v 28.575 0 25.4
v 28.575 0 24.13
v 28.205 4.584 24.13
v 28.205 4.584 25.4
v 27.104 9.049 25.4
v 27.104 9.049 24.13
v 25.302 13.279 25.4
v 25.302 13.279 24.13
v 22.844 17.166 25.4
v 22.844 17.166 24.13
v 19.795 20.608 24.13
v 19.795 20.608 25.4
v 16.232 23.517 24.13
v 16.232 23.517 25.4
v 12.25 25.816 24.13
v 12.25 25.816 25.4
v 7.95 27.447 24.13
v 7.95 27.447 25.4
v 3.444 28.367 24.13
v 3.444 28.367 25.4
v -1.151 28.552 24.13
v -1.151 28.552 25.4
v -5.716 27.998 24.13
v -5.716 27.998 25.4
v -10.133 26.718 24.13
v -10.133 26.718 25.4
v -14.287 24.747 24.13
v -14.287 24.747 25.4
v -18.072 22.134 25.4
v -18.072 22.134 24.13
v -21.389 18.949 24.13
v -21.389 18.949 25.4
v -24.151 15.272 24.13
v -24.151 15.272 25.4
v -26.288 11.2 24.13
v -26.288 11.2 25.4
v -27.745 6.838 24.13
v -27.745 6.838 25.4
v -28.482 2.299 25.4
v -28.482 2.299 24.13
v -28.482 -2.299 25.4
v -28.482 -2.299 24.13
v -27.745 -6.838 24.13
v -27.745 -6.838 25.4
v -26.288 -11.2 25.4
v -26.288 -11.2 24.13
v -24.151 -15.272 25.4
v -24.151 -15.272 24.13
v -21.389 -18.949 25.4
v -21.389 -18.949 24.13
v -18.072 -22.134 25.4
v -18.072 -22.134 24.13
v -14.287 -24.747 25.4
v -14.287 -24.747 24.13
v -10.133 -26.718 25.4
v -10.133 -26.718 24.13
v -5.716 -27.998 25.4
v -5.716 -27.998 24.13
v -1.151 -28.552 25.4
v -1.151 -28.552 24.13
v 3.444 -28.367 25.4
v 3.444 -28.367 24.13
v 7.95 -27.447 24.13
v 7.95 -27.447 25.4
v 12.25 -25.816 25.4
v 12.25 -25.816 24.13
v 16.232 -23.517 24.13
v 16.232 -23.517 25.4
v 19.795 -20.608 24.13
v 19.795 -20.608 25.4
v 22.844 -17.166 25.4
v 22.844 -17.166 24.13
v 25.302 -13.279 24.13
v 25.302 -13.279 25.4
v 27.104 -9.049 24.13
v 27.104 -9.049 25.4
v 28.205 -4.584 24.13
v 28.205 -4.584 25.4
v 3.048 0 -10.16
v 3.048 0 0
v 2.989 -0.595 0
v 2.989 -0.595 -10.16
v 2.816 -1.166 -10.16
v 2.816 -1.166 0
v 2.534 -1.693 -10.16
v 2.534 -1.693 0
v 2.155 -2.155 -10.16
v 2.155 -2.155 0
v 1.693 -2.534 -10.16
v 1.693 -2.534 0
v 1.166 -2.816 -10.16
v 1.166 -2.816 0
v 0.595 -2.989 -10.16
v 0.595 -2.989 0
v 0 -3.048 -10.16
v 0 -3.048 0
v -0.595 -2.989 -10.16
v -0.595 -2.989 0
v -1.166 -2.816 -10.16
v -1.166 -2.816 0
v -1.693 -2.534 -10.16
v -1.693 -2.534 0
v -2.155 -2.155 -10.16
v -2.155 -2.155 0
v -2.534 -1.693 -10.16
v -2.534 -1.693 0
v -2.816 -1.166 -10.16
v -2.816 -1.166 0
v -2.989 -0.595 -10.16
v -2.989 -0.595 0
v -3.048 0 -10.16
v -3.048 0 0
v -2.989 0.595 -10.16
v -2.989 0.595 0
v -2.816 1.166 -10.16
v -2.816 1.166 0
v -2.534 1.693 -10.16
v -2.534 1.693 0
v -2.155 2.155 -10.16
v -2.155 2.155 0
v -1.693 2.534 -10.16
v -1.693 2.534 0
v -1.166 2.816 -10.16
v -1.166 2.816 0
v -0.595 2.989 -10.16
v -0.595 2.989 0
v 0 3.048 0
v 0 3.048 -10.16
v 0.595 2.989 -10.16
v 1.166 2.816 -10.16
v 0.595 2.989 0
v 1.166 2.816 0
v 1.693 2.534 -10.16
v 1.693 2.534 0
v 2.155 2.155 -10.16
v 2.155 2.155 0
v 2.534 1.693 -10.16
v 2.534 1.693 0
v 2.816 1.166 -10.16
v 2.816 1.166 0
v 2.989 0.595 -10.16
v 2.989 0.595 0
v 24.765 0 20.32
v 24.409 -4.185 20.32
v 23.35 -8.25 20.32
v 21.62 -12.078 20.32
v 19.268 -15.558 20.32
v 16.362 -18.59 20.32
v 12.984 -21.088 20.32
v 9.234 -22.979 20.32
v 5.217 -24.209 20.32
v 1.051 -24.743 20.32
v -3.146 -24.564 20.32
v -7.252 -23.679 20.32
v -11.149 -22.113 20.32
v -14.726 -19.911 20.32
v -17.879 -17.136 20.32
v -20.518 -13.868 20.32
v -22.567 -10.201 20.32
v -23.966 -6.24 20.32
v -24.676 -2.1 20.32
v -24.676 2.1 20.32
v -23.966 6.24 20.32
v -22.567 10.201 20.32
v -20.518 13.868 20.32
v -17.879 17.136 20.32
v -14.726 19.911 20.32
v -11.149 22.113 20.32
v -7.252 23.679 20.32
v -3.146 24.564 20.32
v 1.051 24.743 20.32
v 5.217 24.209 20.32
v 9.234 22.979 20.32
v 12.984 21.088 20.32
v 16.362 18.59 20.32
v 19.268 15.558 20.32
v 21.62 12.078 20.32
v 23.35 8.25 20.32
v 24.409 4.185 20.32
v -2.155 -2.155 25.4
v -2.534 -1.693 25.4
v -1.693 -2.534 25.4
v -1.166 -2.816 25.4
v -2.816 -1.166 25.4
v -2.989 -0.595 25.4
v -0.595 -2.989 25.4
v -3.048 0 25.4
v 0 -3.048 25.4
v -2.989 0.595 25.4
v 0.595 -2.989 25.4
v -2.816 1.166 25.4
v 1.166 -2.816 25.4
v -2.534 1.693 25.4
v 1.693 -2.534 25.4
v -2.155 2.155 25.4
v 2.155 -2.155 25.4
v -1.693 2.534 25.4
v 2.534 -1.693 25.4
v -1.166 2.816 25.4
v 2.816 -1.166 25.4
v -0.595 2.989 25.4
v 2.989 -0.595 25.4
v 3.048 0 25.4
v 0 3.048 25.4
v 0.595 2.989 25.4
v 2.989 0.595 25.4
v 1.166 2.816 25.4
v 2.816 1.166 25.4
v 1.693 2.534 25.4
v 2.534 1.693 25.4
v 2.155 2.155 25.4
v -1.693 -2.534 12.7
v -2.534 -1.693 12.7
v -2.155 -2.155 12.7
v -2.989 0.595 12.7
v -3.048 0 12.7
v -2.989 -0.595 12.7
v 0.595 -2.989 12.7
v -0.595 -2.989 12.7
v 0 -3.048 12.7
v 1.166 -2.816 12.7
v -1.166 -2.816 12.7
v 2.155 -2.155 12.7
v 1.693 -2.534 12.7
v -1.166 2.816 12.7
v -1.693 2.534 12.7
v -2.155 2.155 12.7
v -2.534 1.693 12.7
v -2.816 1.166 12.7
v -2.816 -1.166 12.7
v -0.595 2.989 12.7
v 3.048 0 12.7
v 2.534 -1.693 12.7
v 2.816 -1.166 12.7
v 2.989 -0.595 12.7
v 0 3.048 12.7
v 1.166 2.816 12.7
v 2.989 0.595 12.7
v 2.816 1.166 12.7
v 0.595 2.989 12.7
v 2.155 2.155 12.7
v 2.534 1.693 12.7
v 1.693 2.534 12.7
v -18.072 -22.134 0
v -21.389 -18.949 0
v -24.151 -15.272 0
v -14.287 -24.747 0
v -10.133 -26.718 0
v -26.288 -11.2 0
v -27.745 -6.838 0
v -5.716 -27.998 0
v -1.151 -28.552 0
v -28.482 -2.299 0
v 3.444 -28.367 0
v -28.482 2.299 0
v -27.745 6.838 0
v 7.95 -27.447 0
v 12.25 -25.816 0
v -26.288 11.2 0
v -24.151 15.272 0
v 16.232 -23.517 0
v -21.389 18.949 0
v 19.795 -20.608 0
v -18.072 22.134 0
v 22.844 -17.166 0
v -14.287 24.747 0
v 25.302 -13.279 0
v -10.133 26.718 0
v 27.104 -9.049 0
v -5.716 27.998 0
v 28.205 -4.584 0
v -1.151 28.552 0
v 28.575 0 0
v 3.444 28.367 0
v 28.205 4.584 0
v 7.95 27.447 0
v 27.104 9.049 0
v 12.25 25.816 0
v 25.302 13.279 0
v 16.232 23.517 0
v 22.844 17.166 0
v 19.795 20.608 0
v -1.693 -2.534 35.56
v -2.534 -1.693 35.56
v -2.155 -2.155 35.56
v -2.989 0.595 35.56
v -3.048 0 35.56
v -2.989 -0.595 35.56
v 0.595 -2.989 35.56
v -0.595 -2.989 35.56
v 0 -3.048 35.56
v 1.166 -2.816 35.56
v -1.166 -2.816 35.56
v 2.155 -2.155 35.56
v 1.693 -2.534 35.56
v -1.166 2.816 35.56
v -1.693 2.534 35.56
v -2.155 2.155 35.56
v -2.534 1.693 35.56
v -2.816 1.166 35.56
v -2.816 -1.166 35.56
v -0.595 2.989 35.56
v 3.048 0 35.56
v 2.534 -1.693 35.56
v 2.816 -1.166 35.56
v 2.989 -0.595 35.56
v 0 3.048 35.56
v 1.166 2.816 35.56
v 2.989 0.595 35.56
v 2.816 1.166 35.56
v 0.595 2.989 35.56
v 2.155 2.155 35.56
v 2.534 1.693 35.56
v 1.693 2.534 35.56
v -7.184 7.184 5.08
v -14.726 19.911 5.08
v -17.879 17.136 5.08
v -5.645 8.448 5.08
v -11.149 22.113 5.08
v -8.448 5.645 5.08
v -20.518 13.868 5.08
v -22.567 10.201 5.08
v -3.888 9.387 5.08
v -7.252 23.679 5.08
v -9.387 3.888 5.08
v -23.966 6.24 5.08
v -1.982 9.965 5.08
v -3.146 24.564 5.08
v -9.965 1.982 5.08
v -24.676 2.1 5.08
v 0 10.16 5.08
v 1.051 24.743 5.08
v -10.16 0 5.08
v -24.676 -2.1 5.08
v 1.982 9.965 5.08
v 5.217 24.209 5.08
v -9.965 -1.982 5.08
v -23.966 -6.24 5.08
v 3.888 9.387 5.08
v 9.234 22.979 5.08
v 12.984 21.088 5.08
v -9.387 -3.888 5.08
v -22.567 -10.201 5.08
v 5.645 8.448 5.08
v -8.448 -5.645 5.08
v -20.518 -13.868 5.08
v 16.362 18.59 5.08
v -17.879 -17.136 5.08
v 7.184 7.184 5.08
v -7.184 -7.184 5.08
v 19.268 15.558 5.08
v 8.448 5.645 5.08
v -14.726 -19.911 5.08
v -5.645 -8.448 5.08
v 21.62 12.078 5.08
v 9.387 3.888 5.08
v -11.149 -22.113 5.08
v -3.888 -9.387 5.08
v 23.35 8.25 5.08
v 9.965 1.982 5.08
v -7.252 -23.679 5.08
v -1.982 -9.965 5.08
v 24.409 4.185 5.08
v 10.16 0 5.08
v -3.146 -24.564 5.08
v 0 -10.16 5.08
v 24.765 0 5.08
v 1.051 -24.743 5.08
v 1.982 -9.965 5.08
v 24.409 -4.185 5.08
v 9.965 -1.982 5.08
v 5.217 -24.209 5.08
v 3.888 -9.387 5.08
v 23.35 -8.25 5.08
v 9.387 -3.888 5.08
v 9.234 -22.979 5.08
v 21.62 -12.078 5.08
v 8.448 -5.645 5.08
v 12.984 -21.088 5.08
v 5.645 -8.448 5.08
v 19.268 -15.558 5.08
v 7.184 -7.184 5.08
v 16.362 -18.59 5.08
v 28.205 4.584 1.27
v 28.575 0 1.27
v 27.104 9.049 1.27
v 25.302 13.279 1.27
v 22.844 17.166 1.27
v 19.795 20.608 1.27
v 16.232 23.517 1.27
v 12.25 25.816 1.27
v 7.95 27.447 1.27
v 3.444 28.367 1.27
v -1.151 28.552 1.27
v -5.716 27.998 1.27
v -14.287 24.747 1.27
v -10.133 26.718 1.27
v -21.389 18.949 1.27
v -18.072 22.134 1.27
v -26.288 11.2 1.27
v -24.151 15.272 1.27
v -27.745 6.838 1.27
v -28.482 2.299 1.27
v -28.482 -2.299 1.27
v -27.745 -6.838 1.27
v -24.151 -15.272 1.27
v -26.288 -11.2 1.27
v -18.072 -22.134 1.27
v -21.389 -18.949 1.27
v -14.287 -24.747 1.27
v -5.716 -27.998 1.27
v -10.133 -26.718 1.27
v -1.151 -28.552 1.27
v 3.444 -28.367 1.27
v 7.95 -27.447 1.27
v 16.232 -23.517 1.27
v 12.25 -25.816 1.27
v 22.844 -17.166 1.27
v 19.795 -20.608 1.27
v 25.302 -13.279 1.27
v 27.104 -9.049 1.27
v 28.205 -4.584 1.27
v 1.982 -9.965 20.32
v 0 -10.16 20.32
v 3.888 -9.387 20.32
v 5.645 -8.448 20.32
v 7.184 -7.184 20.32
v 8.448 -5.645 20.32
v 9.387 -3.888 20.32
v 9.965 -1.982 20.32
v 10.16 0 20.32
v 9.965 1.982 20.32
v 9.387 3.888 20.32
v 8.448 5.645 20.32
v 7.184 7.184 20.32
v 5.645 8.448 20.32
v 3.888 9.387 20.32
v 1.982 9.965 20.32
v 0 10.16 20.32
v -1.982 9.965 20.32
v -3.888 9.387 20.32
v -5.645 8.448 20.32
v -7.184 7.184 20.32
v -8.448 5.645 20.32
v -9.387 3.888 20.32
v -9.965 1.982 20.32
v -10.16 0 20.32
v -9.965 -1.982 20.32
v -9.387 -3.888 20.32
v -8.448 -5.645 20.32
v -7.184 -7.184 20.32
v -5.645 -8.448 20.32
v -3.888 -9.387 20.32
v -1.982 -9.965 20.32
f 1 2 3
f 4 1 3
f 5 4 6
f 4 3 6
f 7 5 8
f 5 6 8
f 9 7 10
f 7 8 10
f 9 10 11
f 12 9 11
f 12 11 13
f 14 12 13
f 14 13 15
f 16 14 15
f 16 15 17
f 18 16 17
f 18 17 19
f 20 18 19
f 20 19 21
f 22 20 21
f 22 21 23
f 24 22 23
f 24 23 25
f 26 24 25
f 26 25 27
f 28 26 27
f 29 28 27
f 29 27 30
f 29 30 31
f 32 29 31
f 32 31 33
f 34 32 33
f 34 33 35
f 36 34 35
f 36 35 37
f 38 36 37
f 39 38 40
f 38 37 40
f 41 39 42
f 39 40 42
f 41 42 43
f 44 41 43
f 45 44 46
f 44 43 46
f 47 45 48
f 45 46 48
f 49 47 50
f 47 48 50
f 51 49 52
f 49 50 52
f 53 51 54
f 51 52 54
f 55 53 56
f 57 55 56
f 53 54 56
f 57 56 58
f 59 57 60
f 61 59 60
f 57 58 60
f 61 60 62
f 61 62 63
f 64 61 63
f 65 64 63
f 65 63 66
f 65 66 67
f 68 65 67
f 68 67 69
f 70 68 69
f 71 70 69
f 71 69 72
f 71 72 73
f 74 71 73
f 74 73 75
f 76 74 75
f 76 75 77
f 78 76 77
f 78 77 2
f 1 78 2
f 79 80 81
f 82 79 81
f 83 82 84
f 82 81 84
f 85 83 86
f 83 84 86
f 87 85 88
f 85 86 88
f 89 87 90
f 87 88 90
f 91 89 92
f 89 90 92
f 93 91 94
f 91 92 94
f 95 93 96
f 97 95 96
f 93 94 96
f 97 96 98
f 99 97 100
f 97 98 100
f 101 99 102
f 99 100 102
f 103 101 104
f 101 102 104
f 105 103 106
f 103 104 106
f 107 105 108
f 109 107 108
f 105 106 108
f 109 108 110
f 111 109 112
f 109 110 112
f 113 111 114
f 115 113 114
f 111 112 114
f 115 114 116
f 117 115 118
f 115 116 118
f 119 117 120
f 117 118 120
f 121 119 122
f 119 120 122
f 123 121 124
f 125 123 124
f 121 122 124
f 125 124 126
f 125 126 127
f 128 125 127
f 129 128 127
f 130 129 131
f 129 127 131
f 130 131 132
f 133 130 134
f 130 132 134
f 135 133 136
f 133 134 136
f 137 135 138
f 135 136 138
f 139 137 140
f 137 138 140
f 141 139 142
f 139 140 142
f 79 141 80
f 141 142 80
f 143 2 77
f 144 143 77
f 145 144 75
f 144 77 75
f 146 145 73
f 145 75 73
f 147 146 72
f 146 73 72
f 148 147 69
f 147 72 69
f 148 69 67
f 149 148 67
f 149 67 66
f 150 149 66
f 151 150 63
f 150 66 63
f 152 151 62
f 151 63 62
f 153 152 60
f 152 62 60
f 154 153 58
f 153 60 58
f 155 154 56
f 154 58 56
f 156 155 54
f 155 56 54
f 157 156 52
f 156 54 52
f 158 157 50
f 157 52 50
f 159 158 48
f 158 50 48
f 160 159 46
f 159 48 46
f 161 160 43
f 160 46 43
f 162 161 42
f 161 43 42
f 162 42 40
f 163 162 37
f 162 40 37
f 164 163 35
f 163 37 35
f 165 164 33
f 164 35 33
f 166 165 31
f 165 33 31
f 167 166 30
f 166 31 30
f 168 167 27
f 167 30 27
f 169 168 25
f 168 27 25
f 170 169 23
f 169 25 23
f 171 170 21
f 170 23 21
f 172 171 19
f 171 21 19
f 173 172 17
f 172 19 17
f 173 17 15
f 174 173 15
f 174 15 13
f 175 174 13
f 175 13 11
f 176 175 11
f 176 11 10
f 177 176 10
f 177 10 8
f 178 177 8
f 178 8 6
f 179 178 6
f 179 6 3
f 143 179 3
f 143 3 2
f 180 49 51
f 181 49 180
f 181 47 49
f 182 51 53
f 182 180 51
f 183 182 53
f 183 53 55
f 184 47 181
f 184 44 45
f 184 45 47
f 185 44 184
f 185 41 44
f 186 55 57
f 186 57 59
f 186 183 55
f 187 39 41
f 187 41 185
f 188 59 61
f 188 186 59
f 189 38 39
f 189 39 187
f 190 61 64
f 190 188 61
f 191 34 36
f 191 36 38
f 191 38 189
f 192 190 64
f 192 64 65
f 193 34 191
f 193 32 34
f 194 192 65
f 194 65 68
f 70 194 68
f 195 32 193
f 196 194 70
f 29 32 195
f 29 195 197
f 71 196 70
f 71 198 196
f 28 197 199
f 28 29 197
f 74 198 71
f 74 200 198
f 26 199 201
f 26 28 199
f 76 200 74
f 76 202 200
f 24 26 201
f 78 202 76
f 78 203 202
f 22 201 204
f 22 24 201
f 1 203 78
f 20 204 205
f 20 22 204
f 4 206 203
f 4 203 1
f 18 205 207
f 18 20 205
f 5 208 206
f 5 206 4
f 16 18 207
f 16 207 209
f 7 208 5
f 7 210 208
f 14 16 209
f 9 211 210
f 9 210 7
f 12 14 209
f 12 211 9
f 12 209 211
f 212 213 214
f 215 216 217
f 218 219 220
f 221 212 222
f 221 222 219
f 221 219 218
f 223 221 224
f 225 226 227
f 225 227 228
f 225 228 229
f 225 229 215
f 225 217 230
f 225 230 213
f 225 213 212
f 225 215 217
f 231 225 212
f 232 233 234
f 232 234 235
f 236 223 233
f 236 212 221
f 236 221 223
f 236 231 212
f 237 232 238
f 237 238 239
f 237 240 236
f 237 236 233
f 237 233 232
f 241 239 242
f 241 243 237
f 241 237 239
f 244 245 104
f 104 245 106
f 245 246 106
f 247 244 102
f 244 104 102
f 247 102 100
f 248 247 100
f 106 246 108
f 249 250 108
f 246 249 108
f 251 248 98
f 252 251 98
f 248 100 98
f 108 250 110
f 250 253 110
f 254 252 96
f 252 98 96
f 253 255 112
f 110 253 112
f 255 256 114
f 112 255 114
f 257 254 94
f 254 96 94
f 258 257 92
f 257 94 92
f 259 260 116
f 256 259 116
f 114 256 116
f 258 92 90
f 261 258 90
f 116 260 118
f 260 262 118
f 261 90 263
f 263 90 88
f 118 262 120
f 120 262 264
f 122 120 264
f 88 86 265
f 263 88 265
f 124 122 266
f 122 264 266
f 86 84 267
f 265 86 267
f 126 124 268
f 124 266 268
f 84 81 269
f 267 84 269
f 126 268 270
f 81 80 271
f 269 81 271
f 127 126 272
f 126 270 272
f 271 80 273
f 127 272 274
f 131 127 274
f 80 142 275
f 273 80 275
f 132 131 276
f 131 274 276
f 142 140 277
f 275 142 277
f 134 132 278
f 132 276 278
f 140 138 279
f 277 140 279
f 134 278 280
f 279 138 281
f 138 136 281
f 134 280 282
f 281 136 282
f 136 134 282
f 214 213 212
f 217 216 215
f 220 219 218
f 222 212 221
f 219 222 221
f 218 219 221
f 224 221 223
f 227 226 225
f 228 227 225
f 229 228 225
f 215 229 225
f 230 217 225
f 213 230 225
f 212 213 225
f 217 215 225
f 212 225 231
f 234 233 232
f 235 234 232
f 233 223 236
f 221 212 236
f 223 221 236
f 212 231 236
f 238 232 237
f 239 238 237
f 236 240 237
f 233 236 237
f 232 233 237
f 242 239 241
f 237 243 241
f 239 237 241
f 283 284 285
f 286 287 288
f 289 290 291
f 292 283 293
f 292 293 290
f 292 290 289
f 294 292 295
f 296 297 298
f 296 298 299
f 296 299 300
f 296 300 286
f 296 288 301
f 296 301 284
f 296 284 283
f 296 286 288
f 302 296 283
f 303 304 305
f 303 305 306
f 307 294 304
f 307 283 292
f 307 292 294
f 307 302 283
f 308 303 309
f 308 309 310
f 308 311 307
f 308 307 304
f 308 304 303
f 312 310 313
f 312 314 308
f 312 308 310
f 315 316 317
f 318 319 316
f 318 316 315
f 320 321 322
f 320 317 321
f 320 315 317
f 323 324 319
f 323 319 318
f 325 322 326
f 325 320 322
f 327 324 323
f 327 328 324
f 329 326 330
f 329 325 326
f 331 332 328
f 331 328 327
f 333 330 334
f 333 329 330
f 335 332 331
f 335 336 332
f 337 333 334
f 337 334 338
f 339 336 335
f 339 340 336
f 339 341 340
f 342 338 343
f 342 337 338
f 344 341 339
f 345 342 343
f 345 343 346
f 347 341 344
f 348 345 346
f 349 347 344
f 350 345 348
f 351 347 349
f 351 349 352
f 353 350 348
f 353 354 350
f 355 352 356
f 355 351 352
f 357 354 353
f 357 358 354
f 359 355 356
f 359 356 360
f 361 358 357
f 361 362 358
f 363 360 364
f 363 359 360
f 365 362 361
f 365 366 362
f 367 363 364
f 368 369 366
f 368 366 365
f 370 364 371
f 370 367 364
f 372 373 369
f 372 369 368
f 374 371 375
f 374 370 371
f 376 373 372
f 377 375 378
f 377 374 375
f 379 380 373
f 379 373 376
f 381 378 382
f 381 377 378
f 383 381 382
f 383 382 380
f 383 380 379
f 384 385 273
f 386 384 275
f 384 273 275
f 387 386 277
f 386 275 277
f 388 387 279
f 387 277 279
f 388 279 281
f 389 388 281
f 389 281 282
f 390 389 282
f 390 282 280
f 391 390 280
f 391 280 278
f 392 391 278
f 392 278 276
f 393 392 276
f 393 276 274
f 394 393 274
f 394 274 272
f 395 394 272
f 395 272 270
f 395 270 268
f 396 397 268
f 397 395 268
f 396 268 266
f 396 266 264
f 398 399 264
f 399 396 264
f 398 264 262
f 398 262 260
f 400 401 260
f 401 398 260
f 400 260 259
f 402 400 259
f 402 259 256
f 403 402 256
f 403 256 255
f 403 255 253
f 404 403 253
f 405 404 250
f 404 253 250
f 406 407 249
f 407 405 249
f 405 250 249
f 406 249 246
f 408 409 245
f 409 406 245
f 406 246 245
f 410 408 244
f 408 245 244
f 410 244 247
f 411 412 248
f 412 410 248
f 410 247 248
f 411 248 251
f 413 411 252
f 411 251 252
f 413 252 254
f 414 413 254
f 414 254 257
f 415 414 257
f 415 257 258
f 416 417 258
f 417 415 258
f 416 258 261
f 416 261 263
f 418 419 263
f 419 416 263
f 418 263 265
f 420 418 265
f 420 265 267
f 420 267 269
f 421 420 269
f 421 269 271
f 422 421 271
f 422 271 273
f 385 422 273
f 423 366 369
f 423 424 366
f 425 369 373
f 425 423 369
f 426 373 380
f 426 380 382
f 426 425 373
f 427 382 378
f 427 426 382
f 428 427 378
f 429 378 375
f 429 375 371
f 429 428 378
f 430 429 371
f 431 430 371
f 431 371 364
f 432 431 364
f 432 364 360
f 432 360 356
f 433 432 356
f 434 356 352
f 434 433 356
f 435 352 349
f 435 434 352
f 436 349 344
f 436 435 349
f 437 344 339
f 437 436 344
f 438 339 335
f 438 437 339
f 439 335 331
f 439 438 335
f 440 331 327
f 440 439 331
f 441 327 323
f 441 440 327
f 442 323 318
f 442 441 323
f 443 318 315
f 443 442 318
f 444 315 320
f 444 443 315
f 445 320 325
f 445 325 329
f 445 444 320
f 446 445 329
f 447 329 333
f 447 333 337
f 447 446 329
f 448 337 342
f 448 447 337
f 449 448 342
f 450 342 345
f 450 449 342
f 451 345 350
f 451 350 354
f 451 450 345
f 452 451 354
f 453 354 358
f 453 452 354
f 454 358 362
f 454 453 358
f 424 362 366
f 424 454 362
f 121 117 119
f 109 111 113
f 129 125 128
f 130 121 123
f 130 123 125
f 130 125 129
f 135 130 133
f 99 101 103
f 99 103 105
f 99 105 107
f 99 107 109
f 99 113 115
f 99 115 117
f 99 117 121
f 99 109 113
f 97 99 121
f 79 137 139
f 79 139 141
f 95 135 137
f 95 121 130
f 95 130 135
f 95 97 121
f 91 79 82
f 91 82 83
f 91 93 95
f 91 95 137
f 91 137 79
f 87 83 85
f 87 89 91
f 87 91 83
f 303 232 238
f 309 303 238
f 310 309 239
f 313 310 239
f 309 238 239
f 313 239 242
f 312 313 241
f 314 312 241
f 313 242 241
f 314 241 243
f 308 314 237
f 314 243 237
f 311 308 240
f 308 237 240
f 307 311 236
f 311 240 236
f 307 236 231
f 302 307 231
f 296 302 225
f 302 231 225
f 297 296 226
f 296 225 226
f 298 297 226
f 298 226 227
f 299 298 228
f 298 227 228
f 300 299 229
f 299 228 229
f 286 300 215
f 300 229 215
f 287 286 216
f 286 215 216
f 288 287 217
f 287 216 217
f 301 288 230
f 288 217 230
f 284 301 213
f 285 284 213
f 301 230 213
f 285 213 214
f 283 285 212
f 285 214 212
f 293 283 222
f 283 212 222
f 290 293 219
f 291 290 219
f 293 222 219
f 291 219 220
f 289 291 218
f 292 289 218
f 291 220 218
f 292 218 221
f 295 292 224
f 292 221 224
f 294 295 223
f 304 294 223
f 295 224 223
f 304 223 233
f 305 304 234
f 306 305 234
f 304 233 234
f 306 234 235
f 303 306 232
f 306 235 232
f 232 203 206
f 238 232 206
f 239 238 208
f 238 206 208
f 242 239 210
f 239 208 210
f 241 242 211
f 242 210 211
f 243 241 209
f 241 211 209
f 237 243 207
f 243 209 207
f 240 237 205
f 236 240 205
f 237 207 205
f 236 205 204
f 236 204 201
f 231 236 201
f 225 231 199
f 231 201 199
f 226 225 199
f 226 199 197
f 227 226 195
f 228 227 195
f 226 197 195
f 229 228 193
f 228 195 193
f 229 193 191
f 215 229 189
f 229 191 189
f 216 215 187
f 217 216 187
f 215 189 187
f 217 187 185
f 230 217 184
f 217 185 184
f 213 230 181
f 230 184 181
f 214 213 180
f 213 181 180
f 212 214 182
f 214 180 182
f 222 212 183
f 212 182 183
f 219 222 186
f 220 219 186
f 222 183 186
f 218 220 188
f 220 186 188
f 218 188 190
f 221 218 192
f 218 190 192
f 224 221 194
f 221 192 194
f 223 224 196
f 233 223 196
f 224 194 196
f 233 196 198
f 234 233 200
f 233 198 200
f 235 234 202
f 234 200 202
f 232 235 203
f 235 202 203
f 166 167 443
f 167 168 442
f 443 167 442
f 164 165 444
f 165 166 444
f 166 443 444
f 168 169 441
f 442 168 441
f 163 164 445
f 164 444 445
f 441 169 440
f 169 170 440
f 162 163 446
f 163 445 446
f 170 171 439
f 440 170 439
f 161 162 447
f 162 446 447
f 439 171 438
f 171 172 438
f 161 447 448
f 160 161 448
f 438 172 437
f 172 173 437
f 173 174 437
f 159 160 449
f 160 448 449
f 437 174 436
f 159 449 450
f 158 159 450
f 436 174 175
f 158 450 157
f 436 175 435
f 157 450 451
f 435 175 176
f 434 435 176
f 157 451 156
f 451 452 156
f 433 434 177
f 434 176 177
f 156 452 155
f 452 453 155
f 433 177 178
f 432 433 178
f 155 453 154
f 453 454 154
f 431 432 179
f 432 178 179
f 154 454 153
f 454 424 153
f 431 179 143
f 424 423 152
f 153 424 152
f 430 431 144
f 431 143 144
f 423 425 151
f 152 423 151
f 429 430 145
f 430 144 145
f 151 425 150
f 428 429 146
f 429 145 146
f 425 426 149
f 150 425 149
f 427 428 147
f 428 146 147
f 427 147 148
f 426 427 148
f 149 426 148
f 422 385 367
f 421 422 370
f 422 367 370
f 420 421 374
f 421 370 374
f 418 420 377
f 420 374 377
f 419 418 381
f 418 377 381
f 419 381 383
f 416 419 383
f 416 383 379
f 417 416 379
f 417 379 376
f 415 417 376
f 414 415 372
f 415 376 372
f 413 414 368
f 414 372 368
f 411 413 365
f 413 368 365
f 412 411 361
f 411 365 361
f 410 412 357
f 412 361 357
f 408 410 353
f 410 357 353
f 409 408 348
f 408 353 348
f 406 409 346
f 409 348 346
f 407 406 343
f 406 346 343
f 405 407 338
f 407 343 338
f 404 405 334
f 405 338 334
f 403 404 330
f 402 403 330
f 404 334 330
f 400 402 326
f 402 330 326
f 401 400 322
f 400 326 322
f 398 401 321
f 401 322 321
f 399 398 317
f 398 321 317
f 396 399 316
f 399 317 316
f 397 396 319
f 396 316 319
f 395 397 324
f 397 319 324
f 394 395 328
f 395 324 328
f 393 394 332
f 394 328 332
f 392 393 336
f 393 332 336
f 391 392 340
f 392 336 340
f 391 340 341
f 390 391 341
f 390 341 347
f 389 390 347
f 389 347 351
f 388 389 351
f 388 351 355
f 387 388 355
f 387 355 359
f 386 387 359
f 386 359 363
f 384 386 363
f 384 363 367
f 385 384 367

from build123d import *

# Parameters (mm, degrees)
F0_R     = 28.575
F1_DEPTH = 25.4
F2_R     = 3.048
F3_DEPTH = 10.16
F4_R     = 3.048
F5_DEPTH = 12.7
F6_DEPTH = 22.86
F7_W     = 24.8050618141
F7_H     = 15.24
F9_SIZE  = 3.81


with BuildPart() as f1:
    # F0 (on Top) → F1 (new body)
    with BuildSketch(Plane.XY):
        Circle(F0_R)
    extrude(amount=F1_DEPTH)

    # F2 (on face) → F3 (join)
    with BuildSketch(Plane(origin=(0, 0, 0), x_dir=(1, 0, 0), z_dir=(0, 0, -1))):
        Circle(F2_R)
    extrude(amount=F3_DEPTH)

    # F4 (on face) → F5 (cut)
    with BuildSketch(Plane.XY.offset(25.4)):
        Circle(F4_R)
    extrude(amount=-F5_DEPTH, mode=Mode.SUBTRACT)


with BuildPart() as f6:
    # F6 (new): a face of the model
    f6_faces = [f1.part.faces().sort_by_distance(p)[0] for p in [
        (0, 0, 12.7),
    ]]
    extrude(f6_faces, amount=F6_DEPTH)


with BuildPart() as f1_1:
    add(f1.part)

    # F7 (on Right) → F8 (revolve, cut)
    with BuildSketch(Plane.YZ):
        with Locations((-22.5625309071, 12.7)):
            Rectangle(F7_W, F7_H)
    revolve(axis=Axis((0, 0, 35.56), (0, 0, 1)), mode=Mode.SUBTRACT)

    # F9
    f9_edges = [f1_1.edges().sort_by_distance(p)[0] for p in [
        (-28.575, 0, 20.32),
        (-28.575, 0, 5.08),
    ]]
    chamfer(f9_edges, length=F9_SIZE)


solid = Compound([f6.part, f1_1.part])
